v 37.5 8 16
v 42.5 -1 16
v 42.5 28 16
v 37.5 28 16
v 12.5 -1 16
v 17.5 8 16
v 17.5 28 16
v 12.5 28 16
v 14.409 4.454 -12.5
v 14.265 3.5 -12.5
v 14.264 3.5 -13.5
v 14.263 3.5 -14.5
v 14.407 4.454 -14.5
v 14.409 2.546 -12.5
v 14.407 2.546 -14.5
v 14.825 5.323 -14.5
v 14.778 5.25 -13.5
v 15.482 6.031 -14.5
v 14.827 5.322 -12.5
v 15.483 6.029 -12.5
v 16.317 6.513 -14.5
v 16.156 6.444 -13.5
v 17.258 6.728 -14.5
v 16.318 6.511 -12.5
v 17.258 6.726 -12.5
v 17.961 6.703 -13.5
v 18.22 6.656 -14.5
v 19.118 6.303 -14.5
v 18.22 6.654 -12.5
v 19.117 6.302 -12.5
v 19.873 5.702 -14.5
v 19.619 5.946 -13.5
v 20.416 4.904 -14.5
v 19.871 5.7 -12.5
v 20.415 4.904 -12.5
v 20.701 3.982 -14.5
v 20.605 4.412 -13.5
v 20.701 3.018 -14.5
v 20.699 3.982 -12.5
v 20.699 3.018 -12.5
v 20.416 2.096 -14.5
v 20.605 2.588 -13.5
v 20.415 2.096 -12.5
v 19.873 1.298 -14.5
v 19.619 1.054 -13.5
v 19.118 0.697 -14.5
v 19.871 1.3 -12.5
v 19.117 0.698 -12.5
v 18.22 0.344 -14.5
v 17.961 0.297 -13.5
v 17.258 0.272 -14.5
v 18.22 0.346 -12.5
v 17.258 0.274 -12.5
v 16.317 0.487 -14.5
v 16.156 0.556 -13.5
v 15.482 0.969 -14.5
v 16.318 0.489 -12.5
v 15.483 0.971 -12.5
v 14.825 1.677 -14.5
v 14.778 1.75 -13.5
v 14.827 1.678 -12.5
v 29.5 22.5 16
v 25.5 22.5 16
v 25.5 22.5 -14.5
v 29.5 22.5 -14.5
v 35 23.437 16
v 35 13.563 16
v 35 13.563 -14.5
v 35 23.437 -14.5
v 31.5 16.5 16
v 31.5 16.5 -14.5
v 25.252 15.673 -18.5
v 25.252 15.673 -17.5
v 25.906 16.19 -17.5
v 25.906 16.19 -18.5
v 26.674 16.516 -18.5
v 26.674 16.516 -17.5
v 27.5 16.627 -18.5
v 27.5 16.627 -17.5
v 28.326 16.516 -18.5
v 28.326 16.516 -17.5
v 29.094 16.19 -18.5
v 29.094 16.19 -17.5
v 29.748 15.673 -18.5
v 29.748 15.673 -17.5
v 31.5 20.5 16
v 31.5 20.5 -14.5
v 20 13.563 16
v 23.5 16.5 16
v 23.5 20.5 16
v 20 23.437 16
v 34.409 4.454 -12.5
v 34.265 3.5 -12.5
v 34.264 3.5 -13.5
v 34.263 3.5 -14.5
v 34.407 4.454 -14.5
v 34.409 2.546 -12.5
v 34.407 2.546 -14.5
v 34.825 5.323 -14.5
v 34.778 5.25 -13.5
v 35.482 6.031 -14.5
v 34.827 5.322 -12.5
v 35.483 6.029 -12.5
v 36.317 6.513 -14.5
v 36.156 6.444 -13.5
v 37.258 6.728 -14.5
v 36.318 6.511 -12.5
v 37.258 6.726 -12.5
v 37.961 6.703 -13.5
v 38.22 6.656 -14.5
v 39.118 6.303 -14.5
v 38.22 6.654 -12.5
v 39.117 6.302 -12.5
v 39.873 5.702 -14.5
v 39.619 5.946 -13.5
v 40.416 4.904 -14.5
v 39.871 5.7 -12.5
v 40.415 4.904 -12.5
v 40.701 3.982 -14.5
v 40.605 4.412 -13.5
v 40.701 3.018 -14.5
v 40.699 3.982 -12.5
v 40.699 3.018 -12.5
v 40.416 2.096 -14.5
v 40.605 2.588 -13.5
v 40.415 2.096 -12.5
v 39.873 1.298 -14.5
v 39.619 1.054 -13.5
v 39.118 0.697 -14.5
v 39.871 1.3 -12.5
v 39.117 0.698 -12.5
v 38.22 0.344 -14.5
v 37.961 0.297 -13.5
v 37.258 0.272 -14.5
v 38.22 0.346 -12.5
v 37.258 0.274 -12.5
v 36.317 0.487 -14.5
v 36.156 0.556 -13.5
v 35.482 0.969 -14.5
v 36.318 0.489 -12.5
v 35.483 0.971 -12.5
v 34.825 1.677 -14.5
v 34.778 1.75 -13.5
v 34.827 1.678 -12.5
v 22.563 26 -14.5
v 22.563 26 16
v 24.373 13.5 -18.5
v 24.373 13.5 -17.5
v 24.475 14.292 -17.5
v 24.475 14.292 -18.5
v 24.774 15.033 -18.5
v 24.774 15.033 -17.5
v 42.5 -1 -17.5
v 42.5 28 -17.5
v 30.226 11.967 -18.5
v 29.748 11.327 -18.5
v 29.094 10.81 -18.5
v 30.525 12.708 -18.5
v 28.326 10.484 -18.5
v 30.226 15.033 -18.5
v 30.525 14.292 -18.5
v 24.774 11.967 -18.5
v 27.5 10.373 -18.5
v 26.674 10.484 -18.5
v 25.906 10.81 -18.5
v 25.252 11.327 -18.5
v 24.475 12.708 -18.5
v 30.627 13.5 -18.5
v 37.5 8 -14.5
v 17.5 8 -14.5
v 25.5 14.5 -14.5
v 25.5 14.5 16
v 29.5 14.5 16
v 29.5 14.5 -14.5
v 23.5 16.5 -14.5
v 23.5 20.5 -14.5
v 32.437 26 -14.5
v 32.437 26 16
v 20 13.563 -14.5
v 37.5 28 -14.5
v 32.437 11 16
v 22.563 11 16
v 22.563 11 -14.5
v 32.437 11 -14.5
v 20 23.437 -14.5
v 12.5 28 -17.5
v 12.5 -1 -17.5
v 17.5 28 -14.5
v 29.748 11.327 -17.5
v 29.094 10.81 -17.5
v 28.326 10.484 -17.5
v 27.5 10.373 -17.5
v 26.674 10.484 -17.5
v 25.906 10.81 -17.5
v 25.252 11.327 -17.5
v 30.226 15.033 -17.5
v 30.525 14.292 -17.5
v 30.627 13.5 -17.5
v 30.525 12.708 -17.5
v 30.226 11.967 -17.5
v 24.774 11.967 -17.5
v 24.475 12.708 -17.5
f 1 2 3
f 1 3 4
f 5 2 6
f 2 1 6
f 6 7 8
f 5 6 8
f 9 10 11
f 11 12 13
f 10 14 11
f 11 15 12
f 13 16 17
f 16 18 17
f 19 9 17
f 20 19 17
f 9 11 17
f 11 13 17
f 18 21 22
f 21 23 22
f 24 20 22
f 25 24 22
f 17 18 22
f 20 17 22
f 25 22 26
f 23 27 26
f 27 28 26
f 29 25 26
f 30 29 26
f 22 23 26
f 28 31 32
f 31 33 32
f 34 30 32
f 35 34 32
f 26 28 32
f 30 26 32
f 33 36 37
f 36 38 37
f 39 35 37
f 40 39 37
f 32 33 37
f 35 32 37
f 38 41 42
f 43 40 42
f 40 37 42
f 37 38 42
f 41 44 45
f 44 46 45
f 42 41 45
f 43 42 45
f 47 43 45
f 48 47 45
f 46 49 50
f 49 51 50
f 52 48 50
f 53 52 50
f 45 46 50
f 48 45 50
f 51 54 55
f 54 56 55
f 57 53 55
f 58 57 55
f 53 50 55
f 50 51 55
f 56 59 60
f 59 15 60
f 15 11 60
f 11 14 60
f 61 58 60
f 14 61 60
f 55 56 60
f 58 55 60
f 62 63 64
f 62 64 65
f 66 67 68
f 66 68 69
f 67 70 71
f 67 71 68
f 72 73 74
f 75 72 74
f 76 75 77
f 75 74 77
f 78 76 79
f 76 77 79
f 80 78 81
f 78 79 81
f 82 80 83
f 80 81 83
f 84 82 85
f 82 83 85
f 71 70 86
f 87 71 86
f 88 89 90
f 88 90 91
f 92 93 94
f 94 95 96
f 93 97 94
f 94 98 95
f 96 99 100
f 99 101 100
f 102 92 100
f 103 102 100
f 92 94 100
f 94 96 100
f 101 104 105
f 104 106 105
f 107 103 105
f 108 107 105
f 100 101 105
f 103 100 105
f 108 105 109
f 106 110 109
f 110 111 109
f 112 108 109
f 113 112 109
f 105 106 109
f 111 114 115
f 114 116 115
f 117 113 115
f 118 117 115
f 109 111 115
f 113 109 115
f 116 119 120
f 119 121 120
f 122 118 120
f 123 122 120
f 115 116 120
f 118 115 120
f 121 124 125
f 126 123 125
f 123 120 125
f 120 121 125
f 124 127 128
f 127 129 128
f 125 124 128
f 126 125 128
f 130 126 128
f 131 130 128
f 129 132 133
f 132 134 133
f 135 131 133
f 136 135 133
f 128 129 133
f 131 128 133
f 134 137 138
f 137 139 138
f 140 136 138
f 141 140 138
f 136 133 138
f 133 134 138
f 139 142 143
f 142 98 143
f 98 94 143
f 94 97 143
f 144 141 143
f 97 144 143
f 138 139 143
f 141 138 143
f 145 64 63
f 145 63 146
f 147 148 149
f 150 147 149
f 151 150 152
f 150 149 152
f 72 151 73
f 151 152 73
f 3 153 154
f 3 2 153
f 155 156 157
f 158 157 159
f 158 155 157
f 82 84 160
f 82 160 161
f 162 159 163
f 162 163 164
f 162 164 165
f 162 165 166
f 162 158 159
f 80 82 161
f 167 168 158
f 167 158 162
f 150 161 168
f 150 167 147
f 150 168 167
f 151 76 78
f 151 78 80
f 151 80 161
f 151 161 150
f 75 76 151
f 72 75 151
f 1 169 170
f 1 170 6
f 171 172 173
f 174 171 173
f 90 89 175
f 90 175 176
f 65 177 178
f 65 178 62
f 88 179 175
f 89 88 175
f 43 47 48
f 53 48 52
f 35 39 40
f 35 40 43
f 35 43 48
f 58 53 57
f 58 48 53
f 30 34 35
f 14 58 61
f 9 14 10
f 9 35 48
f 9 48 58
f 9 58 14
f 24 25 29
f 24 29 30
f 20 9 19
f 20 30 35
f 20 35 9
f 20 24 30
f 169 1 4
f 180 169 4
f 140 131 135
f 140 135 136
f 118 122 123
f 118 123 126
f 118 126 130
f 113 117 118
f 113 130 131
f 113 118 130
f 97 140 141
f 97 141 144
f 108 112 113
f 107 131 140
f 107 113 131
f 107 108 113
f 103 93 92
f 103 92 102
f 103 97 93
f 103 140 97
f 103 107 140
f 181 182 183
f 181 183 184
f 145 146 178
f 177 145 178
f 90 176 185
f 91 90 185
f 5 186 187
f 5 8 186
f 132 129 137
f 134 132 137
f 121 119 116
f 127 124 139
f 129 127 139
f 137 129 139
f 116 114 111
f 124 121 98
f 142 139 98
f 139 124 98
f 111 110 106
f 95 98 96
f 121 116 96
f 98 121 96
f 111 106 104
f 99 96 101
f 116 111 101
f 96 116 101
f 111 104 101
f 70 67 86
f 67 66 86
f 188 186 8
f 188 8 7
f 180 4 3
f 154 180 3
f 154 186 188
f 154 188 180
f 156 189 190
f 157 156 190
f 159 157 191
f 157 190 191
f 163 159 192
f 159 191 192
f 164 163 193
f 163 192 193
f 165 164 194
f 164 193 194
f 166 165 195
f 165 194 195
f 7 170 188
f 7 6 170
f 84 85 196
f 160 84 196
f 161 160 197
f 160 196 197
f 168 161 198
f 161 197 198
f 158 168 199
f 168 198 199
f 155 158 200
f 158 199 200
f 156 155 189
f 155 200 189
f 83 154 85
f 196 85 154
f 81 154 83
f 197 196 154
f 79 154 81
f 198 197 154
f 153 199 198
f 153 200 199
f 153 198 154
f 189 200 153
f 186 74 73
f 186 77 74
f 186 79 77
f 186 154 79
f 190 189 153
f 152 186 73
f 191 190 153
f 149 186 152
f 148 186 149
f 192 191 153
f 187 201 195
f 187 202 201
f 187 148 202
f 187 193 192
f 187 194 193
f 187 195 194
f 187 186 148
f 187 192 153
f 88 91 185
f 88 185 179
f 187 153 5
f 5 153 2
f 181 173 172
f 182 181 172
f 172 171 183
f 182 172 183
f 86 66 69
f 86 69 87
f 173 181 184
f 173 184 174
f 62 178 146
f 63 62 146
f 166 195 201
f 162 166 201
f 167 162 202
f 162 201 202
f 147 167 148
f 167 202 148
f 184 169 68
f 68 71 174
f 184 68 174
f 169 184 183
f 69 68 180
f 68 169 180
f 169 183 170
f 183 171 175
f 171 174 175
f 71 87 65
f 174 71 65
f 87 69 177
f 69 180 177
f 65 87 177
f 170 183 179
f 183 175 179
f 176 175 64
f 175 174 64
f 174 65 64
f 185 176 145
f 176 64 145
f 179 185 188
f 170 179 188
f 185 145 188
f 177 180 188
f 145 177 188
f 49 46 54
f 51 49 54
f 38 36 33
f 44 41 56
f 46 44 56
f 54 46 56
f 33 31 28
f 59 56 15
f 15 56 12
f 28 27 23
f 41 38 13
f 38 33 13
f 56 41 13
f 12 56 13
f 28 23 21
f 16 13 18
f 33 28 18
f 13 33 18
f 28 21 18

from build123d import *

# Parameters (mm, degrees)
BOSS_EXTRUDE2_DEPTH          = 8
BOSS_EXTRUDE2_DEPTH_BACK     = 1
SKETCH1_R                    = 2.5
CUT_EXTRUDE1_DEPTH           = 79.300702423
CUT_EXTRUDE1_DEPTH_BACK      = 79.300702423
SKETCH2_R                    = 2.5
SKETCH3_R                    = 3.25
CUT_EXTRUDE5_DEPTH           = 15
CUT_EXTRUDE5_DRAFT           = -0.0573
CUT_EXTRUDE5_PROFILE_2_DEPTH = 15
CUT_EXTRUDE5_PROFILE_2_DRAFT = -0.0573
SKETCH5_W                    = 4.5
SKETCH5_H                    = 6.5
BOSS_EXTRUDE3_DEPTH          = 14.5
SKETCH6_R                    = 4
CUT_EXTRUDE4_DEPTH           = 1.5
SKETCH12_W                   = 10.5
SKETCH12_H                   = 30
BOSS_EXTRUDE7_DEPTH          = 9
SKETCH15_W                   = 9
SKETCH15_H                   = 6.5
BOSS_EXTRUDE8_DEPTH          = 3.5
BOSS_EXTRUDE9_DEPTH          = 54
FILLET4_R                    = 5
SKETCH18_W                   = 9.873697418
SKETCH18_H                   = 6.5
BOSS_EXTRUDE11_DEPTH         = 0.5
SKETCH20_W                   = 4
SKETCH20_H                   = 17.5
BOSS_EXTRUDE12_DEPTH         = 18
BOSS_EXTRUDE13_DEPTH         = 11
BOSS_EXTRUDE13_DEPTH_BACK    = 4
SKETCH22_W                   = 17.5
SKETCH22_H                   = 4
SKETCH25_W                   = 2
SKETCH25_H                   = 17.5
BOSS_EXTRUDE14_DEPTH         = 41
SKETCH28_W                   = 41
SKETCH28_H                   = 45
BOSS_EXTRUDE15_DEPTH         = 2
SKETCH29_R                   = 1.75
CUT_EXTRUDE8_DEPTH           = 9
BOSS_EXTRUDE16_DEPTH         = 9
BOSS_EXTRUDE16_DEPTH_BACK    = 4
SKETCH30_W                   = 17.5
SKETCH30_H                   = 2
CUT_EXTRUDE9_DEPTH           = 9
SKETCH32_W                   = 13
SKETCH32_H                   = 4
BOSS_EXTRUDE17_DEPTH         = 23.5
SKETCH33_W                   = 0.5
SKETCH33_H                   = 17.5
BOSS_EXTRUDE18_DEPTH         = 20
SKETCH34_W                   = 4.5
SKETCH34_H                   = 25
SKETCH34_W_2                 = 15.5
SKETCH34_H_2                 = 4
SKETCH34_W_3                 = 9
BOSS_EXTRUDE19_DEPTH         = 26
SKETCH35_W                   = 9.873697418
SKETCH35_H                   = 0.5
BOSS_EXTRUDE20_DEPTH         = 47.5
BOSS_EXTRUDE21_DEPTH         = 47.5
SKETCH38_W                   = 0.419549816
SKETCH38_H                   = 18.5
CUT_EXTRUDE10_DEPTH          = 90.5
SKETCH39_W                   = 4
SKETCH39_H                   = 4
BOSS_EXTRUDE23_DEPTH         = 47.5
SKETCH46_W                   = 22.5
SKETCH46_H                   = 9
SKETCH46_W_2                 = 5
BOSS_EXTRUDE26_DEPTH         = 11.5
SKETCH47_W                   = 27.5
SKETCH47_H                   = 9
BOSS_EXTRUDE27_DEPTH         = 11
SKETCH48_W                   = 5
SKETCH48_H                   = 6.5
BOSS_EXTRUDE31_DEPTH         = 18.5
SKETCH50_R                   = 4
CUT_EXTRUDE11_DEPTH          = 1.5
SKETCH51_W                   = 9.626242636
SKETCH51_H                   = 9.125298808
BOSS_EXTRUDE32_DEPTH         = 1.5
BOSS_EXTRUDE35_DEPTH         = 47.5
SKETCH55_W                   = 9.873697418
SKETCH55_H                   = 0.5
CUT_EXTRUDE12_DEPTH          = 47.5
SKETCH56_W                   = 0.5
SKETCH56_H                   = 20
BOSS_EXTRUDE36_DEPTH         = 43.5
BOSS_EXTRUDE37_DEPTH         = 47.5
SKETCH58_W                   = 0.715052156
SKETCH58_H                   = 9.51279705
CUT_EXTRUDE13_DEPTH          = 4
CUT_EXTRUDE15_DEPTH          = 47.5
SKETCH60_W                   = 0.215052156
SKETCH60_H                   = 9.51279705
CUT_EXTRUDE16_DEPTH          = 47.5
CUT_EXTRUDE17_DEPTH          = 47.5
SKETCH62_W                   = 8
SKETCH62_H                   = 8
CUT_EXTRUDE18_DEPTH          = 47.5
SKETCH63_W                   = 13
SKETCH63_H                   = 4
CUT_EXTRUDE20_DEPTH          = 17
SKETCH64_W                   = 1
SKETCH64_H                   = 1.5
BOSS_EXTRUDE38_DEPTH         = 6.5
SKETCH65_W                   = 7
SKETCH65_H                   = 3
CUT_EXTRUDE21_DEPTH          = 1.5
BOSS_EXTRUDE39_START         = -2
BOSS_EXTRUDE39_DEPTH         = 2
CUT_EXTRUDE22_DEPTH          = 155
CUT_EXTRUDE24_DEPTH          = 100.318930723
CUT_EXTRUDE24_DEPTH_BACK     = 100.318930723
SKETCH71_R                   = 1.75
SKETCH71_R_2                 = 12.5
SKETCH71_W                   = 8.630690043
SKETCH71_H                   = 4
CUT_EXTRUDE25_DEPTH          = 10
CUT_EXTRUDE26_DEPTH          = 78.879714946
CUT_EXTRUDE26_DEPTH_BACK     = 78.879714946
SKETCH72_W                   = 11
SKETCH72_H                   = 4
SKETCH72_W_2                 = 23.5
SKETCH72_H_2                 = 9
SKETCH72_W_3                 = 9
SKETCH72_H_3                 = 16
SKETCH72_W_4                 = 7
SKETCH72_H_4                 = 1.5
BOSS_EXTRUDE40_DEPTH         = 3
CUT_EXTRUDE27_DEPTH          = 49
SKETCH75_W                   = 30
SKETCH75_H                   = 29
BOSS_EXTRUDE41_DEPTH         = 3
BOSS_EXTRUDE42_DEPTH         = 1


with BuildPart() as part:
    # Sketch1 → Boss-Extrude2 (new, two sides: drawn at the far end of the back side and taken through both)
    with BuildSketch(Plane(origin=(0, 0, 0), x_dir=(1, 0, 0), z_dir=(0, 1, 0)).offset(-BOSS_EXTRUDE2_DEPTH_BACK)):
        with BuildLine():
            Line((5, 0), (50, 0))
            ThreePointArc((50, 0), (53.535533906, 1.464466094), (55, 5))
            Line((55, 5), (55, 50))
            ThreePointArc((55, 50), (53.535533906, 53.535533906), (50, 55))
            Line((50, 55), (5, 55))
            ThreePointArc((5, 55), (1.464466094, 53.535533906), (0, 50))
            Line((0, 50), (0, 5))
            ThreePointArc((0, 5), (1.464466094, 1.464466094), (5, 0))
        make_face()
        with Locations(Location((7.5, 47.5, 0), (0, 0, 270))):
            Circle(SKETCH1_R, mode=Mode.SUBTRACT)
        with Locations(Location((47.5, 47.5, 0), (0, 0, 270))):
            Circle(SKETCH1_R, mode=Mode.SUBTRACT)
        with Locations(Location((47.5, 7.5, 0), (0, 0, 270))):
            Circle(SKETCH1_R, mode=Mode.SUBTRACT)
        with Locations(Location((7.5, 7.5, 0), (0, 0, 270))):
            Circle(SKETCH1_R, mode=Mode.SUBTRACT)
    extrude(amount=BOSS_EXTRUDE2_DEPTH + BOSS_EXTRUDE2_DEPTH_BACK)

    # Sketch2 → Cut-Extrude1 (cut, two sides: drawn at the far end of the back side and taken through both)
    with BuildSketch(Plane(origin=(0, 8, 0), x_dir=(1, 0, 0), z_dir=(0, 1, 0)).offset(-CUT_EXTRUDE1_DEPTH_BACK)):
        with BuildLine():
            Line((0, 50), (0, 27.5))
            Line((0, 27.5), (55, 27.5))
            Line((55, 27.5), (55, 50))
            ThreePointArc((55, 50), (53.535533906, 53.535533906), (50, 55))
            Line((50, 55), (5, 55))
            ThreePointArc((5, 55), (1.464466094, 53.535533906), (0, 50))
        make_face()
        with Locations((7.5, 47.5)):
            Circle(SKETCH2_R, mode=Mode.SUBTRACT)
        with Locations((47.5, 47.5)):
            Circle(SKETCH2_R, mode=Mode.SUBTRACT)
    extrude(amount=CUT_EXTRUDE1_DEPTH + CUT_EXTRUDE1_DEPTH_BACK, mode=Mode.SUBTRACT)


with BuildPart() as cut_extrude5_tool:
    # Sketch3 → Cut-Extrude5 (with draft: the straight prism first)
    with BuildSketch(Plane(origin=(0, 0, -27.5), x_dir=(-1, 0, 0), z_dir=(0, 0, -1))):
        with Locations((-37.5, 3.5)):
            Circle(SKETCH3_R)
    extrude(amount=-CUT_EXTRUDE5_DEPTH)
    # Cut-Extrude5: the draft: its side faces are tilted about the plane it starts from
    cut_extrude5_sides = [cut_extrude5_tool.faces().sort_by_distance(p)[0] for p in [
        (40.75, 3.5, -20),
    ]]
    draft(cut_extrude5_sides, Plane(origin=(0, 0, -27.5), x_dir=(-1, 0, 0), z_dir=(0, 0, -1)), CUT_EXTRUDE5_DRAFT)


with BuildPart() as part_1:
    add(part.part)

    # Cut-Extrude5: cut by cut_extrude5_tool
    add(cut_extrude5_tool.part, mode=Mode.SUBTRACT)


with BuildPart() as cut_extrude5_profile_2_tool:
    # Sketch3 → Cut-Extrude5 profile 2 (with draft: the straight prism first)
    with BuildSketch(Plane(origin=(0, 0, -27.5), x_dir=(-1, 0, 0), z_dir=(0, 0, -1))):
        with Locations((-17.5, 3.5)):
            Circle(SKETCH3_R)
    extrude(amount=-CUT_EXTRUDE5_PROFILE_2_DEPTH)
    # Cut-Extrude5 profile 2: the draft: its side faces are tilted about the plane it starts from
    cut_extrude5_profile_2_sides = [cut_extrude5_profile_2_tool.faces().sort_by_distance(p)[0] for p in [
        (20.75, 3.5, -20),
    ]]
    draft(cut_extrude5_profile_2_sides, Plane(origin=(0, 0, -27.5), x_dir=(-1, 0, 0), z_dir=(0, 0, -1)), CUT_EXTRUDE5_PROFILE_2_DRAFT)


with BuildPart() as part_2:
    add(part_1.part)

    # Cut-Extrude5 profile 2: cut by cut_extrude5_profile_2_tool
    add(cut_extrude5_profile_2_tool.part, mode=Mode.SUBTRACT)

    # Sketch5 → Boss-Extrude3 (add)
    with BuildSketch(Plane(origin=(0, 8, 0), x_dir=(1, 0, 0), z_dir=(0, 1, 0))):
        with Locations((25.25, 20.75)):
            Rectangle(SKETCH5_W, SKETCH5_H)
        with Locations((29.75, 20.75)):
            Rectangle(SKETCH5_W, SKETCH5_H)
    extrude(amount=BOSS_EXTRUDE3_DEPTH)

    # Sketch6 → Cut-Extrude4 (cut)
    with BuildSketch(Plane(origin=(0, 0, -24), x_dir=(-1, 0, 0), z_dir=(0, 0, -1))):
        with Locations((-27.5, 17)):
            Circle(SKETCH6_R)
    extrude(amount=-CUT_EXTRUDE4_DEPTH, mode=Mode.SUBTRACT)

    # Sketch12 → Boss-Extrude7 (add)
    with BuildSketch(Plane(origin=(0, 8, 0), x_dir=(1, 0, 0), z_dir=(0, 1, 0))):
        with Locations((32.75, -15)):
            Rectangle(SKETCH12_W, SKETCH12_H)
        with Locations((22.25, -15)):
            Rectangle(SKETCH12_W, SKETCH12_H)
    extrude(amount=-BOSS_EXTRUDE7_DEPTH)

    # Sketch15 → Boss-Extrude8 (add)
    with BuildSketch(Plane(origin=(0, 22.5, 0), x_dir=(1, 0, 0), z_dir=(0, 1, 0))):
        with Locations((27.5, 20.75)):
            Rectangle(SKETCH15_W, SKETCH15_H)
    extrude(amount=BOSS_EXTRUDE8_DEPTH)

    # Sketch11 → Boss-Extrude9 (add)
    with BuildSketch(Plane(origin=(0, 0, -24), x_dir=(-1, 0, 0), z_dir=(0, 0, -1))):
        Polygon((-32.436848709, 26), (-29.5, 22.5), (-29.5, 26), align=None)
        Polygon((-29.5, 22.5), (-27.5, 22.5), (-25.5, 22.5), (-25.5, 26), (-29.5, 26), align=None)
        Polygon((-25.5, 26), (-25.5, 22.5), (-22.563151291, 26), align=None)
    extrude(amount=-BOSS_EXTRUDE9_DEPTH)

    # Fillet4
    fillet4_edges = [part_2.edges().sort_by_distance(p)[0] for p in [
        (27.5, -1, 30),
    ]]
    fillet(fillet4_edges, radius=FILLET4_R)

    # Sketch18 → Boss-Extrude11 (add)
    with BuildSketch(Plane(origin=(0, 26, 0), x_dir=(1, 0, 0), z_dir=(0, 1, 0))):
        with Locations((27.5, 20.75)):
            Rectangle(SKETCH18_W, SKETCH18_H)
    extrude(amount=BOSS_EXTRUDE11_DEPTH)

    # Sketch20 → Boss-Extrude12 (add)
    with BuildSketch(Plane(origin=(0, 8, 0), x_dir=(1, 0, 0), z_dir=(0, 1, 0))):
        with Locations((14.5, 8.75)):
            Rectangle(SKETCH20_W, SKETCH20_H)
        with Locations((40.5, 8.75)):
            Rectangle(SKETCH20_W, SKETCH20_H)
    extrude(amount=BOSS_EXTRUDE12_DEPTH)

    # Sketch22 → Boss-Extrude13 (add, two sides: drawn at the far end of the back side and taken through both)
    with BuildSketch(Plane.ZY.offset(-12.5).offset(-BOSS_EXTRUDE13_DEPTH_BACK)):
        with Locations((-8.75, 26)):
            Rectangle(SKETCH22_W, SKETCH22_H)
    extrude(amount=BOSS_EXTRUDE13_DEPTH + BOSS_EXTRUDE13_DEPTH_BACK)

    # Sketch25 → Boss-Extrude14 (add)
    with BuildSketch(Plane(origin=(0, 28, 0), x_dir=(1, 0, 0), z_dir=(0, 1, 0))):
        with Locations((2.5, 8.75)):
            Rectangle(SKETCH25_W, SKETCH25_H)
    extrude(amount=BOSS_EXTRUDE14_DEPTH)

    # Sketch28 → Boss-Extrude15 (add)
    with BuildSketch(Plane.ZY.offset(-1.5)):
        with Locations((-20.5, 46.5)):
            Rectangle(SKETCH28_W, SKETCH28_H)
    extrude(amount=-BOSS_EXTRUDE15_DEPTH)

    # Sketch29 → Cut-Extrude8 (cut)
    with BuildSketch(Plane.ZY.offset(-1.5)):
        with Locations((-36, 33)):
            Circle(SKETCH29_R)
        with Locations((-5, 64)):
            Circle(SKETCH29_R)
        with Locations((-5, 33)):
            Circle(SKETCH29_R)
        with Locations((-36, 64)):
            Circle(SKETCH29_R)
    extrude(amount=-CUT_EXTRUDE8_DEPTH, mode=Mode.SUBTRACT)

    # Sketch30 → Boss-Extrude16 (add, two sides: drawn at the far end of the back side and taken through both)
    with BuildSketch(Plane(origin=(42.5, 0, 0), x_dir=(0, 0, -1), z_dir=(1, 0, 0)).offset(-BOSS_EXTRUDE16_DEPTH_BACK)):
        with Locations((8.75, 25)):
            Rectangle(SKETCH30_W, SKETCH30_H)
        with Locations((8.75, 27)):
            Rectangle(SKETCH30_W, SKETCH30_H)
    extrude(amount=BOSS_EXTRUDE16_DEPTH + BOSS_EXTRUDE16_DEPTH_BACK)

    # Sketch31 → Cut-Extrude9 (cut)
    with BuildSketch(Plane(origin=(3.5, 0, 0), x_dir=(0, 0, -1), z_dir=(1, 0, 0))):
        with BuildLine():
            ThreePointArc((30.5, 47), (27.571067812, 54.071067812), (20.5, 57))
            Line((20.5, 57), (20.5, 47))
            Line((20.5, 47), (30.5, 47))
        make_face()
        with BuildLine():
            Line((20.5, 47), (20.5, 57))
            ThreePointArc((20.5, 57), (13.428932188, 39.928932188), (30.5, 47))
            Line((30.5, 47), (20.5, 47))
        make_face()
    extrude(amount=-CUT_EXTRUDE9_DEPTH, mode=Mode.SUBTRACT)

    # Sketch32 → Boss-Extrude17 (add)
    with BuildSketch(Plane(origin=(0, 0, -17.5), x_dir=(-1, 0, 0), z_dir=(0, 0, -1))):
        with Locations((-10, 26)):
            Rectangle(SKETCH32_W, SKETCH32_H)
    extrude(amount=BOSS_EXTRUDE17_DEPTH)

    # Sketch33 → Boss-Extrude18 (add)
    with BuildSketch(Plane(origin=(0, 8, 0), x_dir=(1, 0, 0), z_dir=(0, 1, 0))):
        with Locations((38.25, 8.75)):
            Rectangle(SKETCH33_W, SKETCH33_H)
        with Locations((16.75, 8.75)):
            Rectangle(SKETCH33_W, SKETCH33_H)
    extrude(amount=BOSS_EXTRUDE18_DEPTH)

    # Sketch34 → Boss-Extrude19 (add)
    with BuildSketch(Plane.XY):
        with Locations((14.75, 11.5)):
            Rectangle(SKETCH34_W, SKETCH34_H)
        with Locations((9.25, 26)):
            Rectangle(SKETCH34_W_2, SKETCH34_H_2)
        Polygon((42.5, 24), (42.5, 28), (38, 28), (38, 8), (38, -1), (42.5, -1), (42.5, 8), align=None)
        with Locations((47, 26)):
            Rectangle(SKETCH34_W_3, SKETCH34_H_2)
    extrude(amount=BOSS_EXTRUDE19_DEPTH)

    # Sketch35 → Boss-Extrude20 (add)
    with BuildSketch(Plane.XY.offset(-17.5)):
        with Locations((27.5, 26.25)):
            Rectangle(SKETCH35_W, SKETCH35_H)
    extrude(amount=BOSS_EXTRUDE20_DEPTH)

    # Sketch37 → Boss-Extrude21 (add)
    with BuildSketch(Plane.XY.offset(-17.5)):
        Polygon((23, 8), (25.5, 8), (25.5, 12), (23, 9.020616019), align=None)
        Polygon((25.5, 8), (27.5, 8), (29.5, 8), (29.5, 12), (25.5, 12), align=None)
        Polygon((29.5, 12), (29.5, 8), (32, 8), (32, 9.020616019), align=None)
        Polygon((29.5, 8), (27.5, 8), (25.5, 8), (23, 8), (23, 9.020616019), (21.863844179, 7.666598237), (33.136155821, 7.666598237), (32, 9.020616019), (32, 8), align=None)
    extrude(amount=BOSS_EXTRUDE21_DEPTH)

    # Sketch38 → Cut-Extrude10 (cut)
    with BuildSketch(Plane.XY.offset(30)):
        with Locations((22.353376383, 17.25)):
            Rectangle(SKETCH38_W, SKETCH38_H)
        with Locations((32.646623617, 17.25)):
            Rectangle(SKETCH38_W, SKETCH38_H)
    extrude(amount=-CUT_EXTRUDE10_DEPTH, mode=Mode.SUBTRACT)

    # Sketch39 → Boss-Extrude23 (add)
    with BuildSketch(Plane.XY.offset(30)):
        Polygon((21, 19.25), (17.715052156, 22.006398525), (17, 22.006398525), (17, 19.25), align=None)
        with Locations((19, 17.25)):
            Rectangle(SKETCH39_W, SKETCH39_H)
        Polygon((17.715052156, 12.493601475), (21, 15.25), (17, 15.25), (17, 12.493601475), align=None)
        Polygon((37.284947844, 12.493601475), (38, 12.493601475), (38, 15.25), (34, 15.25), align=None)
        Polygon((38, 17.25), (38, 19.25), (34, 19.25), (34, 15.25), (38, 15.25), align=None)
        Polygon((38, 19.25), (38, 22.006398525), (37.284947844, 22.006398525), (34, 19.25), align=None)
    extrude(amount=-BOSS_EXTRUDE23_DEPTH)

    # Sketch46 → Boss-Extrude26 (add)
    with BuildSketch(Plane.ZY):
        with Locations((-16.25, 3.5)):
            Rectangle(SKETCH46_W, SKETCH46_H)
        with Locations((-2.5, 3.5)):
            Rectangle(SKETCH46_W_2, SKETCH46_H)
    extrude(amount=-BOSS_EXTRUDE26_DEPTH)

    # Sketch47 → Boss-Extrude27 (add)
    with BuildSketch(Plane.ZY):
        with Locations((-13.75, 3.5)):
            Rectangle(SKETCH47_W, SKETCH47_H)
    extrude(amount=BOSS_EXTRUDE27_DEPTH)

    # Sketch48 → Boss-Extrude31 (add)
    with BuildSketch(Plane(origin=(0, 8, 0), x_dir=(1, 0, 0), z_dir=(0, 1, 0))):
        Polygon((42.5, 17.5), (42.5, 24), (32, 24), (32, 17.5), (32.436848709, 17.5), (38, 17.5), align=None)
        with Locations((45, 20.75)):
            Rectangle(SKETCH48_W, SKETCH48_H)
        Polygon((12.5, 24), (12.5, 17.5), (17, 17.5), (22.563151291, 17.5), (23, 17.5), (23, 24), align=None)
        with Locations((10, 20.75)):
            Rectangle(SKETCH48_W, SKETCH48_H)
    extrude(amount=BOSS_EXTRUDE31_DEPTH)

    # Sketch50 → Cut-Extrude11 (cut)
    with BuildSketch(Plane(origin=(0, 0, -24), x_dir=(-1, 0, 0), z_dir=(0, 0, -1))):
        with Locations((-17.5, 17)):
            Circle(SKETCH50_R)
        with Locations((-37.5, 17)):
            Circle(SKETCH50_R)
    extrude(amount=-CUT_EXTRUDE11_DEPTH, mode=Mode.SUBTRACT)

    # Sketch51 → Boss-Extrude32 (add)
    with BuildSketch(Plane(origin=(0, 0, -24), x_dir=(-1, 0, 0), z_dir=(0, 0, -1))):
        with Locations((-27.646184708, 17.114099589)):
            Rectangle(SKETCH51_W, SKETCH51_H)
    extrude(amount=-BOSS_EXTRUDE32_DEPTH)

    # Sketch54 → Boss-Extrude35 (add)
    with BuildSketch(Plane.XY.offset(-17.5)):
        Polygon((29.5, 22.5), (27.5, 22.5), (27.5, 14.5), (31.5, 14.5), (31.5, 22.5), align=None)
        Polygon((27.5, 14.5), (27.5, 22.5), (25.5, 22.5), (23.5, 22.5), (23.5, 14.5), align=None)
    extrude(amount=BOSS_EXTRUDE35_DEPTH)

    # Sketch55 → Cut-Extrude12 (cut)
    with BuildSketch(Plane.XY.offset(30)):
        with Locations((27.5, 26.25)):
            Rectangle(SKETCH55_W, SKETCH55_H)
    extrude(amount=-CUT_EXTRUDE12_DEPTH, mode=Mode.SUBTRACT)

    # Sketch56 → Boss-Extrude36 (add)
    with BuildSketch(Plane.XY.offset(26)):
        with Locations((37.75, 18)):
            Rectangle(SKETCH56_W, SKETCH56_H)
        with Locations((17.25, 18)):
            Rectangle(SKETCH56_W, SKETCH56_H)
    extrude(amount=-BOSS_EXTRUDE36_DEPTH)

    # Sketch57 → Boss-Extrude37 (add)
    with BuildSketch(Plane.XY.offset(30)):
        Polygon((35, 23.436848709), (31.5, 20.5), (31.5, 20.428787517), (35, 20.428787517), align=None)
        Polygon((35, 20.428787517), (31.5, 20.428787517), (31.5, 18.5), (35, 18.5), (35, 18.535606241), align=None)
        Polygon((35, 18.5), (31.5, 18.5), (31.5, 16.5), (35, 16.5), (35, 18.464393759), align=None)
        Polygon((35, 16.5), (31.5, 16.5), (35, 13.563151291), align=None)
        Polygon((32.436848709, 11), (29.5, 14.5), (25.5, 14.5), (22.563151291, 11), align=None)
        Polygon((20, 16.5), (23.5, 16.5), (23.5, 18.5), (23.5, 20.5), (20, 23.436848709), (20, 18.535606241), (20, 18.464393759), align=None)
        Polygon((20, 13.563151291), (23.5, 16.5), (20, 16.5), align=None)
    extrude(amount=-BOSS_EXTRUDE37_DEPTH)

    # Sketch58 → Cut-Extrude13 (cut)
    with BuildSketch(Plane.XY.offset(30)):
        with Locations((37.642473922, 17.25)):
            Rectangle(SKETCH58_W, SKETCH58_H)
        with Locations((17.357526078, 17.25)):
            Rectangle(SKETCH58_W, SKETCH58_H)
    extrude(amount=-CUT_EXTRUDE13_DEPTH, mode=Mode.SUBTRACT)

    # Sketch59 → Cut-Extrude15 (cut)
    with BuildSketch(Plane.XY.offset(30)):
        Polygon((37.284947844, 22.006398525), (35, 20.089099631), (35, 14.410900369), (37.284947844, 12.493601475), align=None)
        Polygon((17.715052156, 22.006398525), (20, 20.089099631), (20, 14.410900369), (17.715052156, 12.493601475), align=None)
    extrude(amount=-CUT_EXTRUDE15_DEPTH, mode=Mode.SUBTRACT)

    # Sketch60 → Cut-Extrude16 (cut)
    with BuildSketch(Plane.XY.offset(26)):
        with Locations((37.392473922, 17.25)):
            Rectangle(SKETCH60_W, SKETCH60_H)
        with Locations((17.607526078, 17.25)):
            Rectangle(SKETCH60_W, SKETCH60_H)
    extrude(amount=-CUT_EXTRUDE16_DEPTH, mode=Mode.SUBTRACT)

    # Sketch61 → Cut-Extrude17 (cut)
    with BuildSketch(Plane.XY.offset(30)):
        Polygon((32.436848709, 8), (22.563151291, 8), (22.563151291, 8.5), (24.660900369, 11), (30.339099631, 11), (32.436848709, 8.5), align=None)
    extrude(amount=-CUT_EXTRUDE17_DEPTH, mode=Mode.SUBTRACT)

    # Sketch62 → Cut-Extrude18 (cut)
    with BuildSketch(Plane.XY.offset(30)):
        with Locations((27.5, 18.5)):
            Rectangle(SKETCH62_W, SKETCH62_H)
    extrude(amount=-CUT_EXTRUDE18_DEPTH, mode=Mode.SUBTRACT)

    # Sketch63 → Cut-Extrude20 (cut)
    with BuildSketch(Plane(origin=(0, 0, -41), x_dir=(-1, 0, 0), z_dir=(0, 0, -1))):
        with Locations((-10, 26)):
            Rectangle(SKETCH63_W, SKETCH63_H)
    extrude(amount=-CUT_EXTRUDE20_DEPTH, mode=Mode.SUBTRACT)

    # Sketch64 → Boss-Extrude38 (add)
    with BuildSketch(Plane(origin=(0, 0, -17.5), x_dir=(-1, 0, 0), z_dir=(0, 0, -1))):
        with Locations((-17, 27.25)):
            Rectangle(SKETCH64_W, SKETCH64_H)
    extrude(amount=BOSS_EXTRUDE38_DEPTH)

    # Sketch65 → Cut-Extrude21 (cut)
    with BuildSketch(Plane(origin=(0, 28, 0), x_dir=(1, 0, 0), z_dir=(0, 1, 0))):
        with Locations((48, 16)):
            Rectangle(SKETCH65_W, SKETCH65_H)
    extrude(amount=-CUT_EXTRUDE21_DEPTH, mode=Mode.SUBTRACT)

    # Sketch66 → Boss-Extrude39 (add)
    with BuildSketch(Plane.ZY.offset(-1.5).offset(BOSS_EXTRUDE39_START)):
        with BuildLine():
            ThreePointArc((-30.5, 47), (-20.5, 37), (-10.5, 47))
            Line((-10.5, 47), (-30.5, 47))
        make_face()
        with BuildLine():
            Line((-30.5, 47), (-10.5, 47))
            ThreePointArc((-10.5, 47), (-20.5, 57), (-30.5, 47))
        make_face()
    extrude(amount=BOSS_EXTRUDE39_DEPTH)

    # Sketch67 → Cut-Extrude22 (cut)
    with BuildSketch(Plane.ZY.offset(-1.5)):
        with BuildLine():
            ThreePointArc((-33, 48.5), (-29.338834765, 39.661165235), (-20.5, 36))
            Line((-20.5, 36), (-20.5, 48.5))
            Line((-20.5, 48.5), (-33, 48.5))
        make_face()
        with BuildLine():
            Line((-20.5, 48.5), (-20.5, 36))
            ThreePointArc((-20.5, 36), (-11.661165235, 39.661165235), (-8, 48.5))
            Line((-8, 48.5), (-20.5, 48.5))
        make_face()
        with BuildLine():
            Line((-33, 48.5), (-20.5, 48.5))
            Line((-20.5, 48.5), (-20.5, 61))
            ThreePointArc((-20.5, 61), (-29.338834765, 57.338834765), (-33, 48.5))
        make_face()
        with BuildLine():
            Line((-20.5, 61), (-20.5, 48.5))
            Line((-20.5, 48.5), (-8, 48.5))
            ThreePointArc((-8, 48.5), (-11.661165235, 57.338834765), (-20.5, 61))
        make_face()
    extrude(amount=-CUT_EXTRUDE22_DEPTH, mode=Mode.SUBTRACT)

    # Sketch70 → Cut-Extrude24 (cut, two sides: drawn at the far end of the back side and taken through both)
    with BuildSketch(Plane(origin=(47.5, 0, 0), x_dir=(0, 0, -1), z_dir=(1, 0, 0)).offset(-CUT_EXTRUDE24_DEPTH_BACK)):
        Polygon((24, 26.5), (24, 8), (32.338984554, 8), (32.338984554, 35.599062225), (17.5, 35.599062225), (17.5, 26.5), align=None)
        Polygon((24, 8), (17.5, 8), (17.5, -11.953759578), (33.273947099, -11.953759578), (33.273947099, 8), (32.338984554, 8), align=None)
        Polygon((17.5, 24), (17.5, 8), (24, 8), (24, 26.5), (17.5, 26.5), align=None)
    extrude(amount=CUT_EXTRUDE24_DEPTH + CUT_EXTRUDE24_DEPTH_BACK, mode=Mode.SUBTRACT)


with BuildPart() as cut_extrude24_piece_1:
    # of the separate pieces the step leaves, piece 1, a body of its own (cut_extrude24_pieces)
    add(part_2.part.solids().sort_by_distance((38, 4, 30))[0])

    # Sketch71 → Cut-Extrude25 (cut)
    # profile 1 of 4: a face of its own
    with BuildSketch(Plane(origin=(3.5, 0, 0), x_dir=(0, 0, -1), z_dir=(1, 0, 0))):
        Polygon((0, 98.329177842), (0, 69), (41, 69), (41, 28), (61.289535751, 28), (61.289535751, 98.329177842), align=None)
    # profile 2 of 4: a face of its own
    with BuildSketch(Plane(origin=(3.5, 0, 0), x_dir=(0, 0, -1), z_dir=(1, 0, 0))):
        Polygon((0, 69), (0, 28), (17.5, 28), (17.5, 35.599062225), (32.338984554, 35.599062225), (32.338984554, 28), (32.369309957, 28), (41, 28), (41, 69), align=None)
        with Locations((5, 33)):
            Circle(SKETCH71_R, mode=Mode.SUBTRACT)
        with Locations((36, 33)):
            Circle(SKETCH71_R, mode=Mode.SUBTRACT)
        with Locations((20.5, 48.5)):
            Circle(SKETCH71_R_2, mode=Mode.SUBTRACT)
        with Locations((5, 64)):
            Circle(SKETCH71_R, mode=Mode.SUBTRACT)
        with Locations((36, 64)):
            Circle(SKETCH71_R, mode=Mode.SUBTRACT)
    # profile 3 of 4: a face of its own
    with BuildSketch(Plane(origin=(3.5, 0, 0), x_dir=(0, 0, -1), z_dir=(1, 0, 0))):
        Polygon((61.289535751, 28), (41, 28), (41, 24), (32.369309957, 24), (32.369309957, 8.193802702), (79.936666515, 8.193802702), (79.936666515, 28), align=None)
    # profile 4 of 4: a face of its own
    with BuildSketch(Plane(origin=(3.5, 0, 0), x_dir=(0, 0, -1), z_dir=(1, 0, 0))):
        with Locations((36.684654978, 26)):
            Rectangle(SKETCH71_W, SKETCH71_H)
    extrude(amount=-CUT_EXTRUDE25_DEPTH, mode=Mode.SUBTRACT)


with BuildPart() as cut_extrude24_piece_2:
    # of the separate pieces the step leaves, piece 2, a body of its own (cut_extrude24_pieces)
    add(part_2.part.solids().sort_by_distance((23.5, 20.5, 30))[0])



with BuildPart() as cut_extrude24_piece_3:
    # of the separate pieces the step leaves, piece 3, a body of its own (cut_extrude24_pieces)
    add(part_2.part.solids().sort_by_distance((31.5, 16.5, 30))[0])


with BuildPart() as cut_extrude24_piece_4:
    # of the separate pieces the step leaves, piece 4, a body of its own (cut_extrude24_pieces)
    add(part_2.part.solids().sort_by_distance((32.436848709, 26, -17.5))[0])


with BuildPart() as cut_extrude24_piece_5:
    # of the separate pieces the step leaves, piece 5, a body of its own (cut_extrude24_pieces)
    add(part_2.part.solids().sort_by_distance((32.436848709, 11, 30))[0])


with BuildPart() as cut_extrude25_piece_1:
    # of the separate pieces the step leaves, piece 1, a body of its own (cut_extrude25_pieces)
    add(cut_extrude24_piece_1.part.solids().sort_by_distance((38, 4, 30))[0])


with BuildPart() as cut_extrude25_piece_2:
    # of the separate pieces the step leaves, piece 2, a body of its own (cut_extrude25_pieces)
    add(cut_extrude24_piece_1.part.solids().sort_by_distance((3.5, 28, -32.369309957))[0])


with BuildPart() as cut_extrude26_tool:
    # Sketch72 → Cut-Extrude26 (new, two sides: drawn at the far end of the back side and taken through both)
    with BuildSketch(Plane(origin=(0, 0, -17.5), x_dir=(-1, 0, 0), z_dir=(0, 0, -1)).offset(-CUT_EXTRUDE26_DEPTH_BACK)):
        Polygon((-1.5, 24), (-12.5, 24), (-12.5, 8), (11, 8), (11, 28), (-1.5, 28), align=None)
        with Locations((-7, 26)):
            Rectangle(SKETCH72_W, SKETCH72_H)
        with Locations((-0.75, 3.5)):
            Rectangle(SKETCH72_W_2, SKETCH72_H_2)
        with Locations((-47, 16)):
            Rectangle(SKETCH72_W_3, SKETCH72_H_3)
        Polygon((-51.5, 24), (-42.5, 24), (-42.5, 28), (-44.5, 28), (-44.5, 26.5), (-51.5, 26.5), align=None)
        Polygon((-55, 8), (-51.5, 8), (-51.5, 24), (-51.5, 26.5), (-51.5, 28), (-55, 28), align=None)
        Polygon((-55, -1), (-42.5, -1), (-42.5, 8), (-51.5, 8), (-55, 8), align=None)
        with Locations((-48, 27.25)):
            Rectangle(SKETCH72_W_4, SKETCH72_H_4)
    extrude(amount=CUT_EXTRUDE26_DEPTH + CUT_EXTRUDE26_DEPTH_BACK)


with BuildPart() as cut_extrude25_piece_1_1:
    add(cut_extrude25_piece_1.part)

    # Cut-Extrude26: cut by cut_extrude26_tool
    add(cut_extrude26_tool.part, mode=Mode.SUBTRACT)


with BuildPart() as cut_extrude25_piece_2_1:
    add(cut_extrude25_piece_2.part)

    # Cut-Extrude26: cut by cut_extrude26_tool
    add(cut_extrude26_tool.part, mode=Mode.SUBTRACT)


with BuildPart() as cut_extrude24_piece_2_1:
    add(cut_extrude24_piece_2.part)

    add(cut_extrude24_piece_3.part)  # Boss-Extrude40 merges Cut-Extrude24 piece 3

    add(cut_extrude24_piece_4.part)  # Boss-Extrude40 merges Cut-Extrude24 piece 4

    add(cut_extrude24_piece_5.part)  # Boss-Extrude40 merges Cut-Extrude24 piece 5

    add(cut_extrude25_piece_1_1.part)  # Boss-Extrude40 merges Cut-Extrude25 piece 1
    # Sketch73 → Boss-Extrude40 (add)
    with BuildSketch(Plane(origin=(0, 0, -17.5), x_dir=(-1, 0, 0), z_dir=(0, 0, -1))):
        Polygon((-42.5, 13.5), (-12.5, 13.5), (-12.5, 28), (-27.5, 28), align=None)
    extrude(amount=-BOSS_EXTRUDE40_DEPTH)

    # Sketch74 → Cut-Extrude27 (cut)
    with BuildSketch(Plane(origin=(0, 28, 0), x_dir=(1, 0, 0), z_dir=(0, 1, 0))):
        Polygon((142.438868127, -16), (42.5, -16), (12.5, -16), (12.5, -26), (42.5, -26), (42.5, -16), (42.5, -35.398740347), (12.5, -35.398740347), (12.5, -16), (12.5, 83.938868127), (-109.356799608, -74.497333037), (20.582068519, -174.436201164), align=None)
    extrude(amount=-CUT_EXTRUDE27_DEPTH, mode=Mode.SUBTRACT)


with BuildPart() as cut_extrude27_kept_piece:
    # of the separate pieces the step leaves, the one the design keeps (cut_extrude27_pieces_kept)
    add(cut_extrude24_piece_2_1.part.solids().sort_by_distance((17.5, 8, -17.5))[0])

    # Sketch75 → Boss-Extrude41 (add)
    with BuildSketch(Plane(origin=(0, 0, -17.5), x_dir=(-1, 0, 0), z_dir=(0, 0, -1))):
        with Locations((-27.5, 13.5)):
            Rectangle(SKETCH75_W, SKETCH75_H)
    extrude(amount=-BOSS_EXTRUDE41_DEPTH)

    # Sketch76 → Boss-Extrude42 (add)
    with BuildSketch(Plane(origin=(0, 0, -17.5), x_dir=(-1, 0, 0), z_dir=(0, 0, -1))):
        with BuildLine():
            ThreePointArc((-29.748273901, 11.326668562), (-27.5, 10.373003826), (-25.251726099, 11.326668562))
            Line((-25.251726099, 11.326668562), (-27.5, 13.5))
            Line((-27.5, 13.5), (-29.748273901, 11.326668562))
        make_face()
        with BuildLine():
            Line((-27.5, 13.5), (-25.251726099, 11.326668562))
            ThreePointArc((-25.251726099, 11.326668562), (-24.600995951, 12.327873474), (-24.373003826, 13.5))
            ThreePointArc((-24.373003826, 13.5), (-24.600995951, 14.672126526), (-25.251726099, 15.673331438))
            Line((-25.251726099, 15.673331438), (-27.5, 13.5))
        make_face()
        with BuildLine():
            Line((-29.748273901, 11.326668562), (-27.5, 13.5))
            Line((-27.5, 13.5), (-29.748273901, 15.673331438))
            ThreePointArc((-29.748273901, 15.673331438), (-30.626996174, 13.5), (-29.748273901, 11.326668562))
        make_face()
        with BuildLine():
            Line((-29.748273901, 15.673331438), (-27.5, 13.5))
            Line((-27.5, 13.5), (-25.251726099, 15.673331438))
            ThreePointArc((-25.251726099, 15.673331438), (-27.5, 16.626996174), (-29.748273901, 15.673331438))
        make_face()
    extrude(amount=BOSS_EXTRUDE42_DEPTH)


solid = cut_extrude27_kept_piece.part
